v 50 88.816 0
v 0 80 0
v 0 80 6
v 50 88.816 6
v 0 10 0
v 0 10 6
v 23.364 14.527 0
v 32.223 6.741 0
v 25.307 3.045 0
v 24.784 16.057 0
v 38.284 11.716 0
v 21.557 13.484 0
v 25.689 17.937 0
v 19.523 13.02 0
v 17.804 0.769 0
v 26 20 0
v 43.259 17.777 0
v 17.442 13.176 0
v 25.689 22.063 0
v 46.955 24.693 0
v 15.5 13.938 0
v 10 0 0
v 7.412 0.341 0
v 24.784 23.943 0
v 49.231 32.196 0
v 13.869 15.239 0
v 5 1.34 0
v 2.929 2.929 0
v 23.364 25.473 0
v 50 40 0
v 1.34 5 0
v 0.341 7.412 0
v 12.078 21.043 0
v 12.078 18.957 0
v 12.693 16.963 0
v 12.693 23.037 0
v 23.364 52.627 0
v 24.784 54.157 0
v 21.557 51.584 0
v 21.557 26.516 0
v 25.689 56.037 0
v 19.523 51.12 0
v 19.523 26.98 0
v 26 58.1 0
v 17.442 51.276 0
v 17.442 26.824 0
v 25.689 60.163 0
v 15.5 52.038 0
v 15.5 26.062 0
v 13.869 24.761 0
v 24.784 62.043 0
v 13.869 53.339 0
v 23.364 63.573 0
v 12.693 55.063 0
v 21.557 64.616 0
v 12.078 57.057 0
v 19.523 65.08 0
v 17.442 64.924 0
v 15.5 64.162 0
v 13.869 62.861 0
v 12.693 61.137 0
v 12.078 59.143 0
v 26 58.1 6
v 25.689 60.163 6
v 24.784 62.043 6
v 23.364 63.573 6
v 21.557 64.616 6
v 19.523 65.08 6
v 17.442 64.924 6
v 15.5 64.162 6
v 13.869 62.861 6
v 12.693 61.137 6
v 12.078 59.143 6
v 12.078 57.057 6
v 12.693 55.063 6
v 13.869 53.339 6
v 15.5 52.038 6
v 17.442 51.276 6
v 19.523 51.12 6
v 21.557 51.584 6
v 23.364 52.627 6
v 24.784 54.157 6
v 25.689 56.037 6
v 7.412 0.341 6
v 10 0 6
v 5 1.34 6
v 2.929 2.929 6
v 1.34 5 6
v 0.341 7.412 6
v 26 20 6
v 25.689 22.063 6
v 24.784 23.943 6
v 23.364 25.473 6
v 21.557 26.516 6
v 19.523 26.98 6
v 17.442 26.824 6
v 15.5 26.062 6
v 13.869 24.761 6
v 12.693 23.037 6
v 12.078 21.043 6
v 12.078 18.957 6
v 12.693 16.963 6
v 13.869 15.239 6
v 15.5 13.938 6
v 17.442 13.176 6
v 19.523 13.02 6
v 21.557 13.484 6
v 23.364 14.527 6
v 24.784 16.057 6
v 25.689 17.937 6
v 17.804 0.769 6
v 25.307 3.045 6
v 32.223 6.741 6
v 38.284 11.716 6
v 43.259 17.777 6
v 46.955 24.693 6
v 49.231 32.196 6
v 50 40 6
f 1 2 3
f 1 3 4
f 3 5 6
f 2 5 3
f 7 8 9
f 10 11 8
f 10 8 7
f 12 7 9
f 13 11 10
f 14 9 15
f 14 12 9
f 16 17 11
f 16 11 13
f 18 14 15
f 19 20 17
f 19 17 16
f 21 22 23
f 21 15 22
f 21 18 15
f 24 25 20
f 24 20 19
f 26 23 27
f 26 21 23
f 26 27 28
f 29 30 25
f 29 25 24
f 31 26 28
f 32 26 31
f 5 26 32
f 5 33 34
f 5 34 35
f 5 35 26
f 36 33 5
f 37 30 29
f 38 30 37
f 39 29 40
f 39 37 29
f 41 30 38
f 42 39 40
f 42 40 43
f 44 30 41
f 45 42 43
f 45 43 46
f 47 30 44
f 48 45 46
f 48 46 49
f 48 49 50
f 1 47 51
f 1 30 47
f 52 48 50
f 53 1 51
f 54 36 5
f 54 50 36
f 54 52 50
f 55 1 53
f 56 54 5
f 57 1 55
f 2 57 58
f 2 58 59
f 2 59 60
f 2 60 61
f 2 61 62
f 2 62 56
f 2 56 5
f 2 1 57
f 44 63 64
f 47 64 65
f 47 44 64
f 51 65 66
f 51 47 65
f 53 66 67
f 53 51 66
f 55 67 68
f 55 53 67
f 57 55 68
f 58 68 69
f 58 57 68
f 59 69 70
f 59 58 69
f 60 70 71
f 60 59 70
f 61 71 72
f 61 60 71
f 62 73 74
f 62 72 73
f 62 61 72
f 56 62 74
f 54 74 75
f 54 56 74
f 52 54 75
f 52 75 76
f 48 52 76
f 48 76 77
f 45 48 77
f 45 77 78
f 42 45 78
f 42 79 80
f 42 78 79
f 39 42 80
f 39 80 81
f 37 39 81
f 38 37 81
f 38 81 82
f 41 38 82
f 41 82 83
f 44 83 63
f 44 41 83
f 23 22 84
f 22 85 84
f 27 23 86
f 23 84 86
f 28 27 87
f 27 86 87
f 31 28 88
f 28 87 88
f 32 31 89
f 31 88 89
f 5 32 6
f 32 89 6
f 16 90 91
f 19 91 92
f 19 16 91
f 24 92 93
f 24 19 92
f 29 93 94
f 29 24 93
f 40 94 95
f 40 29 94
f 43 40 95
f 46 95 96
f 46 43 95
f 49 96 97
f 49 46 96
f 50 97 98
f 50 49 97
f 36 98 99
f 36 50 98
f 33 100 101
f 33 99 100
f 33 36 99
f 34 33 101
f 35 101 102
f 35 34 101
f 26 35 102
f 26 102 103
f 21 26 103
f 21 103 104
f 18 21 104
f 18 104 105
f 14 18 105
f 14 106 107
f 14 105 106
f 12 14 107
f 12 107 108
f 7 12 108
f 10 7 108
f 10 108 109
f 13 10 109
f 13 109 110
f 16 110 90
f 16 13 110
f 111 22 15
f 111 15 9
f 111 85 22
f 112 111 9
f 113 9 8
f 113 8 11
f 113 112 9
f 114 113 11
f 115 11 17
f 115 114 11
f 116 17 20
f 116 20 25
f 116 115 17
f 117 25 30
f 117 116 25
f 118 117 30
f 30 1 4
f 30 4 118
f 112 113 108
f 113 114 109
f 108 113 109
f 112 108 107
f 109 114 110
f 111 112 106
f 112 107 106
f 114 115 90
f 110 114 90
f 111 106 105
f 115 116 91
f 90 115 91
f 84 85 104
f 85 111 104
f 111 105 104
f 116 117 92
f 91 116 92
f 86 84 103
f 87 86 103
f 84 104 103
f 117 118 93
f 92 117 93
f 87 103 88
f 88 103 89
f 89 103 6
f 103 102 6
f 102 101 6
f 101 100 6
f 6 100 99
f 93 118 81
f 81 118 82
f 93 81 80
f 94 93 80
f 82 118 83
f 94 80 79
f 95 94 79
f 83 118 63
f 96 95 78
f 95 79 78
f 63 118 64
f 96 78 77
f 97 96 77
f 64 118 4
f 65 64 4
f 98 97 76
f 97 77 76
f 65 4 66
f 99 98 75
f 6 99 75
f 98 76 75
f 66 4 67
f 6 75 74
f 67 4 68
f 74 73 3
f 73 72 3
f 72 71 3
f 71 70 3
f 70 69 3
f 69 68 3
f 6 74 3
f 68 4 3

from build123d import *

# Parameters (mm, degrees)
EXTRUDE_1_DEPTH     = 6
SKETCH_2_R          = 7
CUT_EXTRUDE_1_DEPTH = 103.099676082
FILLET_2_R          = 40
FILLET_3_R          = 10


with BuildPart() as part:
    # Эскиз1 → Бобышка-Вытянуть1 (new body)
    with BuildSketch(Plane.XY):
        Polygon((0, 0), (0, 80), (50, 88.816349035), (50, 0), align=None)
    extrude(amount=EXTRUDE_1_DEPTH)

    # Эскиз2 → Вырез-Вытянуть1 (cut, through all)
    with BuildSketch(Plane.XY):
        with Locations((19, 58.1)):
            Circle(SKETCH_2_R)
        with Locations((19, 20)):
            Circle(SKETCH_2_R)
    extrude(amount=CUT_EXTRUDE_1_DEPTH, mode=Mode.SUBTRACT)

    # Скругление2
    fillet_2_edges = [part.edges().sort_by_distance(p)[0] for p in [
        (50, 0, 3),
    ]]
    fillet(fillet_2_edges, radius=FILLET_2_R)

    # Скругление3
    fillet_3_edges = [part.edges().sort_by_distance(p)[0] for p in [
        (0, 0, 3),
    ]]
    fillet(fillet_3_edges, radius=FILLET_3_R - 0.0001)  # a hair under: the kernel refuses the full size


solid = part.part
